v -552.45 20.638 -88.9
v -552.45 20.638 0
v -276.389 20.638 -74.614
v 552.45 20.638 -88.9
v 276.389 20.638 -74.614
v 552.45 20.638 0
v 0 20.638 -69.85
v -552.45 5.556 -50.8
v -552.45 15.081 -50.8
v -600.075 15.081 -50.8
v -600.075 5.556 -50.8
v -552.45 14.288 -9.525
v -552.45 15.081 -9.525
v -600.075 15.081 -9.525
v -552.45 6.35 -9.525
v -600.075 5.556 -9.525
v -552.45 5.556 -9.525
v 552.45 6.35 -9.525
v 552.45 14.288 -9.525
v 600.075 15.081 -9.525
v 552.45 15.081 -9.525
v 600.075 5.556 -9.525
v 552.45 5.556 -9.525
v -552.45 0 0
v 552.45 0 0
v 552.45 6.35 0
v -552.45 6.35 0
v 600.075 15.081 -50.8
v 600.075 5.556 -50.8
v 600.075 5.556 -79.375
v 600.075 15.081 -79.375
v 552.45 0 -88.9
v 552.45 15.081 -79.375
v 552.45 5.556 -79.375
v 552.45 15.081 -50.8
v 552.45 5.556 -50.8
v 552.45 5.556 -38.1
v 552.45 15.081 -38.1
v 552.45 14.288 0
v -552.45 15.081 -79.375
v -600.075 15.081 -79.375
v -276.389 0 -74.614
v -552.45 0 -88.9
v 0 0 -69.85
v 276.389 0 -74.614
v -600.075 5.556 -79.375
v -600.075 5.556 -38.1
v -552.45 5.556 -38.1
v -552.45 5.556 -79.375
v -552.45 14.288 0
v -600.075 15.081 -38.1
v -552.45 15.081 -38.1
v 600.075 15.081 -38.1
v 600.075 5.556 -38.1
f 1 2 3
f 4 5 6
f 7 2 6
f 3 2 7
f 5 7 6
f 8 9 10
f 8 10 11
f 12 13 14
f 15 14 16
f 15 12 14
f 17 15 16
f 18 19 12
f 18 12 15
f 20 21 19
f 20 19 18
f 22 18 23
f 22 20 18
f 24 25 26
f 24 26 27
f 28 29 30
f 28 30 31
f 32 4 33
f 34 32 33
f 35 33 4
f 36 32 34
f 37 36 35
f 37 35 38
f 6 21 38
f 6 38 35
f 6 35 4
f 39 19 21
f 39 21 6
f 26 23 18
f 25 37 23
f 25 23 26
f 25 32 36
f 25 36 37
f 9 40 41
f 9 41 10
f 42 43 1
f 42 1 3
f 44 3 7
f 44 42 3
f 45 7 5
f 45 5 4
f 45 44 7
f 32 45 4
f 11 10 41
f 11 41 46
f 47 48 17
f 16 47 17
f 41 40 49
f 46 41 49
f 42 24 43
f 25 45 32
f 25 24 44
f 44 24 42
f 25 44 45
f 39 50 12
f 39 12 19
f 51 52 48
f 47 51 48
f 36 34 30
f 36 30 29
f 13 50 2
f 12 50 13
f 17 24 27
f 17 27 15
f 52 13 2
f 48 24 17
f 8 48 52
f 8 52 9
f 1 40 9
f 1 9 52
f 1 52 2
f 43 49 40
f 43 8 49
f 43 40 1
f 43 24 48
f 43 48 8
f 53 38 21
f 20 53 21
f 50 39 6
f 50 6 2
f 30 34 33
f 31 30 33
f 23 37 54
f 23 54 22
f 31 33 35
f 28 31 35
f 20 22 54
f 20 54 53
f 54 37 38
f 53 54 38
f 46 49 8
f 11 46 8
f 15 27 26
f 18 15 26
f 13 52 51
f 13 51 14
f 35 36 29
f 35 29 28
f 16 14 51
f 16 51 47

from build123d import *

# Parameters (mm, degrees)
F1_DEPTH = 20.6375
F2_W     = 9.525
F2_H     = 28.575
F3_DEPTH = 47.625
F4_W     = 9.525
F4_H     = 28.575
F5_DEPTH = 47.625
F6_W     = 1104.9
F6_H     = 7.9375
F7_DEPTH = 9.525


with BuildPart() as f1:
    # F0 (on Front) → F1 (new body)
    with BuildSketch(Plane.XZ):
        with BuildLine():
            Line((552.45, 0), (0, 0))
            Line((0, 0), (-552.45, 0))
            Line((-552.45, 0), (-552.45, -88.9))
            ThreePointArc((-552.45, -88.9), (0, -69.85), (552.45, -88.9))
            Line((552.45, -88.9), (552.45, 0))
        make_face()
    extrude(amount=-F1_DEPTH)

    # F2 (on face) → F3 (join)
    with BuildSketch(Plane(origin=(-552.45, 0, 0), x_dir=(0, -1, 0), z_dir=(-1, 0, 0))):
        with Locations((-10.31875, -23.8125)):
            Rectangle(F2_W, F2_H)
        with Locations((-10.31875, -65.0875)):
            Rectangle(F2_W, F2_H)
    extrude(amount=F3_DEPTH)

    # F4 (on face) → F5 (join)
    with BuildSketch(Plane.YZ.offset(552.45)):
        with Locations((10.31875, -23.8125)):
            Rectangle(F4_W, F4_H)
        with Locations((10.31875, -65.0875)):
            Rectangle(F4_W, F4_H)
    extrude(amount=F5_DEPTH)

    # F6 (on face) → F7 (cut)
    with BuildSketch(Plane.XY):
        with Locations((0, 10.31875)):
            Rectangle(F6_W, F6_H)
    extrude(amount=-F7_DEPTH, mode=Mode.SUBTRACT)


solid = f1.part
